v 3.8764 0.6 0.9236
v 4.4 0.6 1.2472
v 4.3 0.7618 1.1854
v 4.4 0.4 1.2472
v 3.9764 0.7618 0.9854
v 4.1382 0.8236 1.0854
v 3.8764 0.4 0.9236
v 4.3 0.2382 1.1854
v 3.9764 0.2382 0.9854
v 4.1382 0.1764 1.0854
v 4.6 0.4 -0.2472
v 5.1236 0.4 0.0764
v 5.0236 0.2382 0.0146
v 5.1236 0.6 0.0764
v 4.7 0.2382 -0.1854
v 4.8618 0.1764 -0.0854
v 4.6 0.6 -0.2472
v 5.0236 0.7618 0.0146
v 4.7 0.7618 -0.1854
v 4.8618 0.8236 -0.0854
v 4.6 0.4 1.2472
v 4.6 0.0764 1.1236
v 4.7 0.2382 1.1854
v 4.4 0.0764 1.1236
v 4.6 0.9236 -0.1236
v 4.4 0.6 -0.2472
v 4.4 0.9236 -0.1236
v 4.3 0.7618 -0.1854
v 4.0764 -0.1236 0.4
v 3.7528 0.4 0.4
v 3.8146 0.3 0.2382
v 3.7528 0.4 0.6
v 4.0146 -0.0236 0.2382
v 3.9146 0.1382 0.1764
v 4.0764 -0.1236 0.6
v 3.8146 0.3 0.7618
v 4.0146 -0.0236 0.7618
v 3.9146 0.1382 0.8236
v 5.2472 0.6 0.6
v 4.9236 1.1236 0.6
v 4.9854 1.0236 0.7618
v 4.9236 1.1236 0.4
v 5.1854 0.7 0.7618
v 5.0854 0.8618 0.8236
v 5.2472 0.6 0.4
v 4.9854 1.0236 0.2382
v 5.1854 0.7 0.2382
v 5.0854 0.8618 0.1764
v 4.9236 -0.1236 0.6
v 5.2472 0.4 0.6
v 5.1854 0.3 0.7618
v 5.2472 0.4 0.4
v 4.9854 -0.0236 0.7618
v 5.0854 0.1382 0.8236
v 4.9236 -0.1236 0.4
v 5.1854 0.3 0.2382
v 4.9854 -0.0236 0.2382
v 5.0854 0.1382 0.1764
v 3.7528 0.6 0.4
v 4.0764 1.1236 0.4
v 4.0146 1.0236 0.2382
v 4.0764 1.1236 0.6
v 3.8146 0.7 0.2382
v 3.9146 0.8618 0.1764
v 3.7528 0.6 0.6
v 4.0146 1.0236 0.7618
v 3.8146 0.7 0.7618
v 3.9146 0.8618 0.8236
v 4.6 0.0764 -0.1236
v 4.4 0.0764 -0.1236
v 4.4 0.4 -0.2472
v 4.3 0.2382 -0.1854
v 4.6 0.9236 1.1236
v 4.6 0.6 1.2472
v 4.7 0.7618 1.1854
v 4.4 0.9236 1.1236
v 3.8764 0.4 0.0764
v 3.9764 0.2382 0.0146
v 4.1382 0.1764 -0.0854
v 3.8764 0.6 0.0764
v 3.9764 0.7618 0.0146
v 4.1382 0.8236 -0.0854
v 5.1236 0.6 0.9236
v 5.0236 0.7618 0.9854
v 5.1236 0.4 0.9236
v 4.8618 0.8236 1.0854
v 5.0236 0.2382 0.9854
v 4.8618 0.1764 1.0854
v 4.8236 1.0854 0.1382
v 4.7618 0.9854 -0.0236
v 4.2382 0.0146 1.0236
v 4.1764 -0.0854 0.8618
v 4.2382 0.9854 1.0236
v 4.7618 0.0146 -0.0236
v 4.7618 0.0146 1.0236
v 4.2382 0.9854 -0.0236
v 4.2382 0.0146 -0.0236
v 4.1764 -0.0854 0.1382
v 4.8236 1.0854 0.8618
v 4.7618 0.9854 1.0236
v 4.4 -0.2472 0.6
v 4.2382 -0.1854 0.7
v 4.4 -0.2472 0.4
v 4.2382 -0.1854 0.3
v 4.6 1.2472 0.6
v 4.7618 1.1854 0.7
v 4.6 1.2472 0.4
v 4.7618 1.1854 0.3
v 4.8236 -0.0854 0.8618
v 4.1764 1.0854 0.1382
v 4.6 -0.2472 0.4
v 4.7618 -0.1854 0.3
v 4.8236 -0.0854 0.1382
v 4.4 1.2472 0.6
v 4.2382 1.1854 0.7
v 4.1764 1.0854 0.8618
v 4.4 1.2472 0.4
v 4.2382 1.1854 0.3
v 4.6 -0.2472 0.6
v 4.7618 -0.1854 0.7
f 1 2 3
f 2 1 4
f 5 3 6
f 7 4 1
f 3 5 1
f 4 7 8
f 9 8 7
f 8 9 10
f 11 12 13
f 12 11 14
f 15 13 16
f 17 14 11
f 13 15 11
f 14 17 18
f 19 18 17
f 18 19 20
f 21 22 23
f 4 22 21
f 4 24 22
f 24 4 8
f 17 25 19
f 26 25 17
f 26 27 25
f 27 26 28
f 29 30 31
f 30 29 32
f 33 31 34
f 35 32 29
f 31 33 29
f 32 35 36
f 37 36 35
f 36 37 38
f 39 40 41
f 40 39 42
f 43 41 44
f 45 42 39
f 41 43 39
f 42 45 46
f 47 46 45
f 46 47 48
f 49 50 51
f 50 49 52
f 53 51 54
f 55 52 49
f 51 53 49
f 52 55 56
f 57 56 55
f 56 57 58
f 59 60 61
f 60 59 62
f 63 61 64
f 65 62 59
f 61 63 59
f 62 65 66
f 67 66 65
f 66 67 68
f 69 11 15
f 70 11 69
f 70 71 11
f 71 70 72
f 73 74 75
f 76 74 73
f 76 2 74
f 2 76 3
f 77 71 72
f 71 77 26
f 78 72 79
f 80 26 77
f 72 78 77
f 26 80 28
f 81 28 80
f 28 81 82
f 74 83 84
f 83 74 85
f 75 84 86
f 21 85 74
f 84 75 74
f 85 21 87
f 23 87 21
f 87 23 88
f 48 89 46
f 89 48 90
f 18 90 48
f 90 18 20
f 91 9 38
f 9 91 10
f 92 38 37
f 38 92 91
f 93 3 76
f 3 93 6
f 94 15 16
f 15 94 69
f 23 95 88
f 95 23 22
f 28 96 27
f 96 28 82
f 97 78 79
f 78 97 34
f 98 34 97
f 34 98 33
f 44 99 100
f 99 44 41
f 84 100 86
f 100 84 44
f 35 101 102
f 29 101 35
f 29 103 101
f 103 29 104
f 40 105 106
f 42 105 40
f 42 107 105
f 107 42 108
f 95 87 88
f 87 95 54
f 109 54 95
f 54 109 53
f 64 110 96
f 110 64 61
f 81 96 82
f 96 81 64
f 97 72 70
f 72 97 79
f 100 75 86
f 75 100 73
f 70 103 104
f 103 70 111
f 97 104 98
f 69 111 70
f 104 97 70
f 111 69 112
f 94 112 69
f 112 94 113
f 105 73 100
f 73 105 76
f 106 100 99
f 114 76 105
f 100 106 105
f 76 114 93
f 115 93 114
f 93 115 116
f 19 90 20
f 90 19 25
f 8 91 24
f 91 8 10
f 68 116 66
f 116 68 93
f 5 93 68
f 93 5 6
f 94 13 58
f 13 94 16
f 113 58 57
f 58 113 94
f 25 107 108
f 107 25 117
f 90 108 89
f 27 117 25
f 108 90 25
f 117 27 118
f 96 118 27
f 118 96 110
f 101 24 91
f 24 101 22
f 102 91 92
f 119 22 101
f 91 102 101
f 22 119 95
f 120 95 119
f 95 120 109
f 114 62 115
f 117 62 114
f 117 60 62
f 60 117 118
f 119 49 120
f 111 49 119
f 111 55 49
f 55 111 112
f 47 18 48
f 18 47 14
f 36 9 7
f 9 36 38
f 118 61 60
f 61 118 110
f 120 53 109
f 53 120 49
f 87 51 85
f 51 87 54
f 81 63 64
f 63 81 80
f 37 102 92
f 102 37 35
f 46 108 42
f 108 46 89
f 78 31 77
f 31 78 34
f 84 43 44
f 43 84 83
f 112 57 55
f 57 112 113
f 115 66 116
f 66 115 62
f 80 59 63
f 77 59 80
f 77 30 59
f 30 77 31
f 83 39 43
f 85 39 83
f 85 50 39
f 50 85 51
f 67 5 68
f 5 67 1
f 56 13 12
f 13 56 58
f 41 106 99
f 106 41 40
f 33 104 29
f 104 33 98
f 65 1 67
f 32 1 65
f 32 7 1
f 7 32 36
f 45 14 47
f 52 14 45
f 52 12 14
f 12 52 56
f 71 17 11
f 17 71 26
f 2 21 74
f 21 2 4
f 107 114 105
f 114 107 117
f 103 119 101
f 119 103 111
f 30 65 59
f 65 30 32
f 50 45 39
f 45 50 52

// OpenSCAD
// Real-world non-planar polyhedron() example (truncated icosidodecahedron)
// from OpenSCAD's own test corpus
// (tests/data/scad/3D/features/polyhedron-nonplanar-tests.scad upstream),
// wrapped in scale(0.02) — a bare scalar, not a [x,y,z] vector. See
// docs/roadmap.md v3.9/v3.10 and issue #86.
translate([4.5,0.5,0.5]) scale(0.02) polyhedron(points = [
[-10., -13.090169943749475, -34.270509831248425],
[-10., -13.090169943749475, 34.270509831248425],
[-10., 13.090169943749475, -34.270509831248425],
[-10., 13.090169943749475, 34.270509831248425],
[-5., -5., -37.3606797749979], [-5., -5., 37.3606797749979],
[-5., 5., -37.3606797749979], [-5., 5., 37.3606797749979],
[-5., -37.3606797749979, -5.], [-5., -37.3606797749979, 5.],
[-5., -21.18033988749895, -31.18033988749895],
[-5., -21.18033988749895, 31.18033988749895], [-5., 37.3606797749979, -5.],
[-5., 37.3606797749979, 5.], [-5., 21.18033988749895, -31.18033988749895],
[-5., 21.18033988749895, 31.18033988749895], [5., -5., -37.3606797749979],
[5., -5., 37.3606797749979], [5., 5., -37.3606797749979],
[5., 5., 37.3606797749979], [5., -37.3606797749979, -5.],
[5., -37.3606797749979, 5.], [5., -21.18033988749895, -31.18033988749895],
[5., -21.18033988749895, 31.18033988749895], [5., 37.3606797749979, -5.],
[5., 37.3606797749979, 5.], [5., 21.18033988749895, -31.18033988749895],
[5., 21.18033988749895, 31.18033988749895], [10., -13.090169943749475,
 -34.270509831248425], [10., -13.090169943749475, 34.270509831248425],
[10., 13.090169943749475, -34.270509831248425],
[10., 13.090169943749475, 34.270509831248425],
[-34.270509831248425, -10., -13.090169943749475],
[-34.270509831248425, -10., 13.090169943749475],
[-34.270509831248425, 10., -13.090169943749475],
[-34.270509831248425, 10., 13.090169943749475],
[-29.270509831248425, -18.090169943749473, -16.18033988749895],
[-29.270509831248425, -18.090169943749473, 16.18033988749895],
[-29.270509831248425, 18.090169943749473, -16.18033988749895],
[-29.270509831248425, 18.090169943749473, 16.18033988749895],
[-18.090169943749473, -16.18033988749895, -29.270509831248425],
[-18.090169943749473, -16.18033988749895, 29.270509831248425],
[-18.090169943749473, 16.18033988749895, -29.270509831248425],
[-18.090169943749473, 16.18033988749895, 29.270509831248425],
[-13.090169943749475, -34.270509831248425, -10.],
[-13.090169943749475, -34.270509831248425, 10.],
[-13.090169943749475, -24.270509831248425, -26.18033988749895],
[-13.090169943749475, -24.270509831248425, 26.18033988749895],
[-13.090169943749475, 24.270509831248425, -26.18033988749895],
[-13.090169943749475, 24.270509831248425, 26.18033988749895],
[-13.090169943749475, 34.270509831248425, -10.],
[-13.090169943749475, 34.270509831248425, 10.],
[-26.18033988749895, -13.090169943749475, -24.270509831248425],
[-26.18033988749895, -13.090169943749475, 24.270509831248425],
[-26.18033988749895, 13.090169943749475, -24.270509831248425],
[-26.18033988749895, 13.090169943749475, 24.270509831248425],
[-37.3606797749979, -5., -5.], [-37.3606797749979, -5., 5.],
[-37.3606797749979, 5., -5.], [-37.3606797749979, 5., 5.],
[-16.18033988749895, -29.270509831248425, -18.090169943749473],
[-16.18033988749895, -29.270509831248425, 18.090169943749473],
[-16.18033988749895, 29.270509831248425, -18.090169943749473],
[-16.18033988749895, 29.270509831248425, 18.090169943749473],
[-31.18033988749895, -5., -21.18033988749895],
[-31.18033988749895, -5., 21.18033988749895],
[-31.18033988749895, 5., -21.18033988749895],
[-31.18033988749895, 5., 21.18033988749895],
[-21.18033988749895, -31.18033988749895, -5.],
[-21.18033988749895, -31.18033988749895, 5.],
[-21.18033988749895, 31.18033988749895, -5.],
[-21.18033988749895, 31.18033988749895, 5.],
[-24.270509831248425, -26.18033988749895, -13.090169943749475],
[-24.270509831248425, -26.18033988749895, 13.090169943749475],
[-24.270509831248425, 26.18033988749895, -13.090169943749475],
[-24.270509831248425, 26.18033988749895, 13.090169943749475],
[16.18033988749895, -29.270509831248425, -18.090169943749473],
[16.18033988749895, -29.270509831248425, 18.090169943749473],
[16.18033988749895, 29.270509831248425, -18.090169943749473],
[16.18033988749895, 29.270509831248425, 18.090169943749473],
[24.270509831248425, -26.18033988749895, -13.090169943749475],
[24.270509831248425, -26.18033988749895, 13.090169943749475],
[24.270509831248425, 26.18033988749895, -13.090169943749475],
[24.270509831248425, 26.18033988749895, 13.090169943749475],
[37.3606797749979, -5., -5.], [37.3606797749979, -5., 5.],
[37.3606797749979, 5., -5.], [37.3606797749979, 5., 5.],
[21.18033988749895, -31.18033988749895, -5.],
[21.18033988749895, -31.18033988749895, 5.],
[21.18033988749895, 31.18033988749895, -5.],
[21.18033988749895, 31.18033988749895, 5.],
[13.090169943749475, -34.270509831248425, -10.],
[13.090169943749475, -34.270509831248425, 10.],
[13.090169943749475, -24.270509831248425, -26.18033988749895],
[13.090169943749475, -24.270509831248425, 26.18033988749895],
[13.090169943749475, 24.270509831248425, -26.18033988749895],
[13.090169943749475, 24.270509831248425, 26.18033988749895],
[13.090169943749475, 34.270509831248425, -10.],
[13.090169943749475, 34.270509831248425, 10.],
[26.18033988749895, -13.090169943749475, -24.270509831248425],
[26.18033988749895, -13.090169943749475, 24.270509831248425],
[26.18033988749895, 13.090169943749475, -24.270509831248425],
[26.18033988749895, 13.090169943749475, 24.270509831248425],
[31.18033988749895, -5., -21.18033988749895],
[31.18033988749895, -5., 21.18033988749895],
[31.18033988749895, 5., -21.18033988749895],
[31.18033988749895, 5., 21.18033988749895],
[18.090169943749473, -16.18033988749895, -29.270509831248425],
[18.090169943749473, -16.18033988749895, 29.270509831248425],
[18.090169943749473, 16.18033988749895, -29.270509831248425],
[18.090169943749473, 16.18033988749895, 29.270509831248425],
[29.270509831248425, -18.090169943749473, -16.18033988749895],
[29.270509831248425, -18.090169943749473, 16.18033988749895],
[29.270509831248425, 18.090169943749473, -16.18033988749895],
[29.270509831248425, 18.090169943749473, 16.18033988749895],
[34.270509831248425, -10., -13.090169943749475],
[34.270509831248425, -10., 13.090169943749475],
[34.270509831248425, 10., -13.090169943749475],
[34.270509831248425, 10., 13.090169943749475]],faces =
[[41, 53, 65, 67, 55, 43, 3, 7, 5, 1], [100, 104, 106, 102, 110, 30, 18, 16,
 28, 108], [11, 1, 5, 17, 29, 23], [18, 30, 26, 14, 2, 6],
[33, 37, 73, 69, 68, 72, 36, 32, 56, 57], [91, 90, 82, 114, 118, 86, 87,
 119, 115, 83], [81, 113, 117, 85, 84, 116, 112, 80, 88, 89],
[59, 58, 34, 38, 74, 70, 71, 75, 39, 35], [0, 10, 22, 28, 16, 4],
[15, 27, 31, 19, 7, 3], [64, 52, 40, 0, 4, 6, 2, 42, 54, 66],
[19, 31, 111, 103, 107, 105, 101, 109, 29, 17], [96, 110, 102, 114, 82, 78],
[53, 41, 47, 61, 73, 37], [43, 49, 15, 3], [94, 108, 28, 22],
[23, 29, 109, 95], [2, 14, 48, 42], [36, 72, 60, 46, 40, 52],
[79, 83, 115, 103, 111, 97], [69, 45, 9, 8, 44, 68],
[24, 98, 90, 91, 99, 25], [77, 95, 109, 101, 113, 81],
[42, 48, 62, 74, 38, 54], [40, 46, 10, 0], [97, 111, 31, 27],
[44, 8, 20, 92, 76, 94, 22, 10, 46, 60], [63, 51, 13, 25, 99, 79, 97, 27,
 15, 49], [26, 30, 110, 96], [1, 11, 47, 41], [55, 39, 75, 63, 49, 43],
[80, 112, 100, 108, 94, 76], [48, 14, 26, 96, 78, 98, 24, 12, 50, 62],
[61, 47, 11, 23, 95, 77, 93, 21, 9, 45], [71, 70, 50, 12, 13, 51],
[93, 89, 88, 92, 20, 21], [102, 106, 118, 114], [65, 53, 37, 33],
[74, 62, 50, 70], [77, 81, 89, 93], [101, 105, 117, 113], [66, 54, 38, 34],
[73, 61, 45, 69], [78, 82, 90, 98], [32, 36, 52, 64], [115, 119, 107, 103],
[92, 88, 80, 76], [71, 51, 63, 75], [56, 32, 64, 66, 34, 58],
[107, 119, 87, 85, 117, 105], [35, 39, 55, 67], [112, 116, 104, 100],
[99, 91, 83, 79], [68, 44, 60, 72], [57, 59, 35, 67, 65, 33],
[116, 84, 86, 118, 106, 104], [4, 16, 18, 6], [7, 19, 17, 5],
[12, 24, 25, 13], [9, 21, 20, 8], [56, 58, 59, 57], [85, 87, 86, 84]]
);
